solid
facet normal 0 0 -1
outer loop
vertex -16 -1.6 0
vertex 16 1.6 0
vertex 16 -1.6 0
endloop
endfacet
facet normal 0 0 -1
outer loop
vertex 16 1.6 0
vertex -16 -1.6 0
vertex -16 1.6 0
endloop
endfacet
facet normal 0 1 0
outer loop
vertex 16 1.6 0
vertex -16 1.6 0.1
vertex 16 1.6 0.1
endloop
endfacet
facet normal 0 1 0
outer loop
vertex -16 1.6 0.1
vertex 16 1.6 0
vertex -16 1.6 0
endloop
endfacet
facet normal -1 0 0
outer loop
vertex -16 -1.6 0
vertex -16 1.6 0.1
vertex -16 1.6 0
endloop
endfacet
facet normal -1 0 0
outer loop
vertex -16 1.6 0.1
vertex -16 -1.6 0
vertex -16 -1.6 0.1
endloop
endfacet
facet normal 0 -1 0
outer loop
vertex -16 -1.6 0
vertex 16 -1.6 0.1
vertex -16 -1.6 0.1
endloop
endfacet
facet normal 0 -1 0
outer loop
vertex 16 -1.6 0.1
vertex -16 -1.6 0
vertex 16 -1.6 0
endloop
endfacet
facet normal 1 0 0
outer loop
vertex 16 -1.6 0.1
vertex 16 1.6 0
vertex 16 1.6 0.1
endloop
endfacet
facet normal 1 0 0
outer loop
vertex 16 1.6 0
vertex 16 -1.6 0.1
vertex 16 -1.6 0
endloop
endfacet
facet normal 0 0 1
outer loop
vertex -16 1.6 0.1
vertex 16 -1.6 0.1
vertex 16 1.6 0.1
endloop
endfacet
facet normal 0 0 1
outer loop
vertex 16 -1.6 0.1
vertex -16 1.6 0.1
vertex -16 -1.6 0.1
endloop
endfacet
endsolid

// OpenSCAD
// file: ../p/box5-12.scad
use <../lib.scad>
function ldraw_lib__box5_12() = [
// 0 Box with 5 Faces without Any Edges
// 0 Name: box5-12.dat
// 0 Author: Chris Dee [cwdee]
// 0 !LDRAW_ORG Primitive UPDATE 2009-02
// 0 !LICENSE Licensed under CC BY 4.0 : see CAreadme.txt
// 
// 0 BFC CERTIFY CCW
  [0,"BFC","CERTIFY"],
  [0,"BFC","CCW"],
// 
// 0 !HISTORY 2009-09-03 [PTadmin] Official Update 2009-02
// 
// 
// 4 16 1 1 1 1 1 -1 -1 1 -1 -1 1 1
  [4,16,1,1,1,1,1,-1,-1,1,-1,-1,1,1],
// 4 16 -1 0 1 1 0 1 1 1 1 -1 1 1
  [4,16,-1,0,1,1,0,1,1,1,1,-1,1,1],
// 4 16 -1 0 -1 -1 0 1 -1 1 1 -1 1 -1
  [4,16,-1,0,-1,-1,0,1,-1,1,1,-1,1,-1],
// 4 16 1 0 -1 -1 0 -1 -1 1 -1 1 1 -1
  [4,16,1,0,-1,-1,0,-1,-1,1,-1,1,1,-1],
// 4 16 1 0 1 1 0 -1 1 1 -1 1 1 1
  [4,16,1,0,1,1,0,-1,1,1,-1,1,1,1],
// 0
];
module ldraw_lib__box5_12(step=0, col=false, unit=2/5, alt=false, line=0.2, solid=!$preview)
    makepoly(ldraw_lib__box5_12(), step=step, col=col, unit=unit, alt=alt, line=line, solid=solid);
ldraw_lib__box5_12(line=0.2);
// main file
use <../lib.scad>
use <../p/box5-12.scad>
function ldraw_lib__191485p() = [
// 0 Sticker  0.4 x  4.0 Light Blue
// 0 Name: 191485p.dat
// 0 Author: Rene Rechthaler [Blechtaler]
// 0 !LDRAW_ORG Part UPDATE 2024-01
// 0 !LICENSE Licensed under CC BY 4.0 : see CAreadme.txt
// 
// 0 !HELP PLACE ON 3037: 1 16 0 12 -22 1 0 0 0 0.7071 -0.7071 0 0.7071 0.7071 191485p.dat
// 
// 0 BFC CERTIFY CCW
  [0,"BFC","CERTIFY"],
  [0,"BFC","CCW"],
// 
// 0 !KEYWORDS Set 1554
// 
// 0 !HISTORY 2023-10-21 [Blechtaler] used MagFors color 0x237A1E8
// 0 !HISTORY 2024-01-29 [OrionP] Official Update 2024-01
// 
// 1 16 0 -.25 0 40 0 0 0 .25 0 0 0 4 box5-12.dat
  [1,16,0,-.25,0,40,0,0,0,.25,0,0,0,4, ldraw_lib__box5_12()],
// 
// 4 0x237A1E8 -40 -.25 4 -40 -.25 -4 40 -.25 -4 40 -.25 4
  [4,37200360,-40,-.25,4,-40,-.25,-4,40,-.25,-4,40,-.25,4],
];
module ldraw_lib__191485p(step=0, col=false, unit=2/5, alt=false, line=0.2, solid=!$preview)
    makepoly(ldraw_lib__191485p(), step=step, col=col, unit=unit, alt=alt, line=line, solid=solid);
ldraw_lib__191485p(line=0.2);
